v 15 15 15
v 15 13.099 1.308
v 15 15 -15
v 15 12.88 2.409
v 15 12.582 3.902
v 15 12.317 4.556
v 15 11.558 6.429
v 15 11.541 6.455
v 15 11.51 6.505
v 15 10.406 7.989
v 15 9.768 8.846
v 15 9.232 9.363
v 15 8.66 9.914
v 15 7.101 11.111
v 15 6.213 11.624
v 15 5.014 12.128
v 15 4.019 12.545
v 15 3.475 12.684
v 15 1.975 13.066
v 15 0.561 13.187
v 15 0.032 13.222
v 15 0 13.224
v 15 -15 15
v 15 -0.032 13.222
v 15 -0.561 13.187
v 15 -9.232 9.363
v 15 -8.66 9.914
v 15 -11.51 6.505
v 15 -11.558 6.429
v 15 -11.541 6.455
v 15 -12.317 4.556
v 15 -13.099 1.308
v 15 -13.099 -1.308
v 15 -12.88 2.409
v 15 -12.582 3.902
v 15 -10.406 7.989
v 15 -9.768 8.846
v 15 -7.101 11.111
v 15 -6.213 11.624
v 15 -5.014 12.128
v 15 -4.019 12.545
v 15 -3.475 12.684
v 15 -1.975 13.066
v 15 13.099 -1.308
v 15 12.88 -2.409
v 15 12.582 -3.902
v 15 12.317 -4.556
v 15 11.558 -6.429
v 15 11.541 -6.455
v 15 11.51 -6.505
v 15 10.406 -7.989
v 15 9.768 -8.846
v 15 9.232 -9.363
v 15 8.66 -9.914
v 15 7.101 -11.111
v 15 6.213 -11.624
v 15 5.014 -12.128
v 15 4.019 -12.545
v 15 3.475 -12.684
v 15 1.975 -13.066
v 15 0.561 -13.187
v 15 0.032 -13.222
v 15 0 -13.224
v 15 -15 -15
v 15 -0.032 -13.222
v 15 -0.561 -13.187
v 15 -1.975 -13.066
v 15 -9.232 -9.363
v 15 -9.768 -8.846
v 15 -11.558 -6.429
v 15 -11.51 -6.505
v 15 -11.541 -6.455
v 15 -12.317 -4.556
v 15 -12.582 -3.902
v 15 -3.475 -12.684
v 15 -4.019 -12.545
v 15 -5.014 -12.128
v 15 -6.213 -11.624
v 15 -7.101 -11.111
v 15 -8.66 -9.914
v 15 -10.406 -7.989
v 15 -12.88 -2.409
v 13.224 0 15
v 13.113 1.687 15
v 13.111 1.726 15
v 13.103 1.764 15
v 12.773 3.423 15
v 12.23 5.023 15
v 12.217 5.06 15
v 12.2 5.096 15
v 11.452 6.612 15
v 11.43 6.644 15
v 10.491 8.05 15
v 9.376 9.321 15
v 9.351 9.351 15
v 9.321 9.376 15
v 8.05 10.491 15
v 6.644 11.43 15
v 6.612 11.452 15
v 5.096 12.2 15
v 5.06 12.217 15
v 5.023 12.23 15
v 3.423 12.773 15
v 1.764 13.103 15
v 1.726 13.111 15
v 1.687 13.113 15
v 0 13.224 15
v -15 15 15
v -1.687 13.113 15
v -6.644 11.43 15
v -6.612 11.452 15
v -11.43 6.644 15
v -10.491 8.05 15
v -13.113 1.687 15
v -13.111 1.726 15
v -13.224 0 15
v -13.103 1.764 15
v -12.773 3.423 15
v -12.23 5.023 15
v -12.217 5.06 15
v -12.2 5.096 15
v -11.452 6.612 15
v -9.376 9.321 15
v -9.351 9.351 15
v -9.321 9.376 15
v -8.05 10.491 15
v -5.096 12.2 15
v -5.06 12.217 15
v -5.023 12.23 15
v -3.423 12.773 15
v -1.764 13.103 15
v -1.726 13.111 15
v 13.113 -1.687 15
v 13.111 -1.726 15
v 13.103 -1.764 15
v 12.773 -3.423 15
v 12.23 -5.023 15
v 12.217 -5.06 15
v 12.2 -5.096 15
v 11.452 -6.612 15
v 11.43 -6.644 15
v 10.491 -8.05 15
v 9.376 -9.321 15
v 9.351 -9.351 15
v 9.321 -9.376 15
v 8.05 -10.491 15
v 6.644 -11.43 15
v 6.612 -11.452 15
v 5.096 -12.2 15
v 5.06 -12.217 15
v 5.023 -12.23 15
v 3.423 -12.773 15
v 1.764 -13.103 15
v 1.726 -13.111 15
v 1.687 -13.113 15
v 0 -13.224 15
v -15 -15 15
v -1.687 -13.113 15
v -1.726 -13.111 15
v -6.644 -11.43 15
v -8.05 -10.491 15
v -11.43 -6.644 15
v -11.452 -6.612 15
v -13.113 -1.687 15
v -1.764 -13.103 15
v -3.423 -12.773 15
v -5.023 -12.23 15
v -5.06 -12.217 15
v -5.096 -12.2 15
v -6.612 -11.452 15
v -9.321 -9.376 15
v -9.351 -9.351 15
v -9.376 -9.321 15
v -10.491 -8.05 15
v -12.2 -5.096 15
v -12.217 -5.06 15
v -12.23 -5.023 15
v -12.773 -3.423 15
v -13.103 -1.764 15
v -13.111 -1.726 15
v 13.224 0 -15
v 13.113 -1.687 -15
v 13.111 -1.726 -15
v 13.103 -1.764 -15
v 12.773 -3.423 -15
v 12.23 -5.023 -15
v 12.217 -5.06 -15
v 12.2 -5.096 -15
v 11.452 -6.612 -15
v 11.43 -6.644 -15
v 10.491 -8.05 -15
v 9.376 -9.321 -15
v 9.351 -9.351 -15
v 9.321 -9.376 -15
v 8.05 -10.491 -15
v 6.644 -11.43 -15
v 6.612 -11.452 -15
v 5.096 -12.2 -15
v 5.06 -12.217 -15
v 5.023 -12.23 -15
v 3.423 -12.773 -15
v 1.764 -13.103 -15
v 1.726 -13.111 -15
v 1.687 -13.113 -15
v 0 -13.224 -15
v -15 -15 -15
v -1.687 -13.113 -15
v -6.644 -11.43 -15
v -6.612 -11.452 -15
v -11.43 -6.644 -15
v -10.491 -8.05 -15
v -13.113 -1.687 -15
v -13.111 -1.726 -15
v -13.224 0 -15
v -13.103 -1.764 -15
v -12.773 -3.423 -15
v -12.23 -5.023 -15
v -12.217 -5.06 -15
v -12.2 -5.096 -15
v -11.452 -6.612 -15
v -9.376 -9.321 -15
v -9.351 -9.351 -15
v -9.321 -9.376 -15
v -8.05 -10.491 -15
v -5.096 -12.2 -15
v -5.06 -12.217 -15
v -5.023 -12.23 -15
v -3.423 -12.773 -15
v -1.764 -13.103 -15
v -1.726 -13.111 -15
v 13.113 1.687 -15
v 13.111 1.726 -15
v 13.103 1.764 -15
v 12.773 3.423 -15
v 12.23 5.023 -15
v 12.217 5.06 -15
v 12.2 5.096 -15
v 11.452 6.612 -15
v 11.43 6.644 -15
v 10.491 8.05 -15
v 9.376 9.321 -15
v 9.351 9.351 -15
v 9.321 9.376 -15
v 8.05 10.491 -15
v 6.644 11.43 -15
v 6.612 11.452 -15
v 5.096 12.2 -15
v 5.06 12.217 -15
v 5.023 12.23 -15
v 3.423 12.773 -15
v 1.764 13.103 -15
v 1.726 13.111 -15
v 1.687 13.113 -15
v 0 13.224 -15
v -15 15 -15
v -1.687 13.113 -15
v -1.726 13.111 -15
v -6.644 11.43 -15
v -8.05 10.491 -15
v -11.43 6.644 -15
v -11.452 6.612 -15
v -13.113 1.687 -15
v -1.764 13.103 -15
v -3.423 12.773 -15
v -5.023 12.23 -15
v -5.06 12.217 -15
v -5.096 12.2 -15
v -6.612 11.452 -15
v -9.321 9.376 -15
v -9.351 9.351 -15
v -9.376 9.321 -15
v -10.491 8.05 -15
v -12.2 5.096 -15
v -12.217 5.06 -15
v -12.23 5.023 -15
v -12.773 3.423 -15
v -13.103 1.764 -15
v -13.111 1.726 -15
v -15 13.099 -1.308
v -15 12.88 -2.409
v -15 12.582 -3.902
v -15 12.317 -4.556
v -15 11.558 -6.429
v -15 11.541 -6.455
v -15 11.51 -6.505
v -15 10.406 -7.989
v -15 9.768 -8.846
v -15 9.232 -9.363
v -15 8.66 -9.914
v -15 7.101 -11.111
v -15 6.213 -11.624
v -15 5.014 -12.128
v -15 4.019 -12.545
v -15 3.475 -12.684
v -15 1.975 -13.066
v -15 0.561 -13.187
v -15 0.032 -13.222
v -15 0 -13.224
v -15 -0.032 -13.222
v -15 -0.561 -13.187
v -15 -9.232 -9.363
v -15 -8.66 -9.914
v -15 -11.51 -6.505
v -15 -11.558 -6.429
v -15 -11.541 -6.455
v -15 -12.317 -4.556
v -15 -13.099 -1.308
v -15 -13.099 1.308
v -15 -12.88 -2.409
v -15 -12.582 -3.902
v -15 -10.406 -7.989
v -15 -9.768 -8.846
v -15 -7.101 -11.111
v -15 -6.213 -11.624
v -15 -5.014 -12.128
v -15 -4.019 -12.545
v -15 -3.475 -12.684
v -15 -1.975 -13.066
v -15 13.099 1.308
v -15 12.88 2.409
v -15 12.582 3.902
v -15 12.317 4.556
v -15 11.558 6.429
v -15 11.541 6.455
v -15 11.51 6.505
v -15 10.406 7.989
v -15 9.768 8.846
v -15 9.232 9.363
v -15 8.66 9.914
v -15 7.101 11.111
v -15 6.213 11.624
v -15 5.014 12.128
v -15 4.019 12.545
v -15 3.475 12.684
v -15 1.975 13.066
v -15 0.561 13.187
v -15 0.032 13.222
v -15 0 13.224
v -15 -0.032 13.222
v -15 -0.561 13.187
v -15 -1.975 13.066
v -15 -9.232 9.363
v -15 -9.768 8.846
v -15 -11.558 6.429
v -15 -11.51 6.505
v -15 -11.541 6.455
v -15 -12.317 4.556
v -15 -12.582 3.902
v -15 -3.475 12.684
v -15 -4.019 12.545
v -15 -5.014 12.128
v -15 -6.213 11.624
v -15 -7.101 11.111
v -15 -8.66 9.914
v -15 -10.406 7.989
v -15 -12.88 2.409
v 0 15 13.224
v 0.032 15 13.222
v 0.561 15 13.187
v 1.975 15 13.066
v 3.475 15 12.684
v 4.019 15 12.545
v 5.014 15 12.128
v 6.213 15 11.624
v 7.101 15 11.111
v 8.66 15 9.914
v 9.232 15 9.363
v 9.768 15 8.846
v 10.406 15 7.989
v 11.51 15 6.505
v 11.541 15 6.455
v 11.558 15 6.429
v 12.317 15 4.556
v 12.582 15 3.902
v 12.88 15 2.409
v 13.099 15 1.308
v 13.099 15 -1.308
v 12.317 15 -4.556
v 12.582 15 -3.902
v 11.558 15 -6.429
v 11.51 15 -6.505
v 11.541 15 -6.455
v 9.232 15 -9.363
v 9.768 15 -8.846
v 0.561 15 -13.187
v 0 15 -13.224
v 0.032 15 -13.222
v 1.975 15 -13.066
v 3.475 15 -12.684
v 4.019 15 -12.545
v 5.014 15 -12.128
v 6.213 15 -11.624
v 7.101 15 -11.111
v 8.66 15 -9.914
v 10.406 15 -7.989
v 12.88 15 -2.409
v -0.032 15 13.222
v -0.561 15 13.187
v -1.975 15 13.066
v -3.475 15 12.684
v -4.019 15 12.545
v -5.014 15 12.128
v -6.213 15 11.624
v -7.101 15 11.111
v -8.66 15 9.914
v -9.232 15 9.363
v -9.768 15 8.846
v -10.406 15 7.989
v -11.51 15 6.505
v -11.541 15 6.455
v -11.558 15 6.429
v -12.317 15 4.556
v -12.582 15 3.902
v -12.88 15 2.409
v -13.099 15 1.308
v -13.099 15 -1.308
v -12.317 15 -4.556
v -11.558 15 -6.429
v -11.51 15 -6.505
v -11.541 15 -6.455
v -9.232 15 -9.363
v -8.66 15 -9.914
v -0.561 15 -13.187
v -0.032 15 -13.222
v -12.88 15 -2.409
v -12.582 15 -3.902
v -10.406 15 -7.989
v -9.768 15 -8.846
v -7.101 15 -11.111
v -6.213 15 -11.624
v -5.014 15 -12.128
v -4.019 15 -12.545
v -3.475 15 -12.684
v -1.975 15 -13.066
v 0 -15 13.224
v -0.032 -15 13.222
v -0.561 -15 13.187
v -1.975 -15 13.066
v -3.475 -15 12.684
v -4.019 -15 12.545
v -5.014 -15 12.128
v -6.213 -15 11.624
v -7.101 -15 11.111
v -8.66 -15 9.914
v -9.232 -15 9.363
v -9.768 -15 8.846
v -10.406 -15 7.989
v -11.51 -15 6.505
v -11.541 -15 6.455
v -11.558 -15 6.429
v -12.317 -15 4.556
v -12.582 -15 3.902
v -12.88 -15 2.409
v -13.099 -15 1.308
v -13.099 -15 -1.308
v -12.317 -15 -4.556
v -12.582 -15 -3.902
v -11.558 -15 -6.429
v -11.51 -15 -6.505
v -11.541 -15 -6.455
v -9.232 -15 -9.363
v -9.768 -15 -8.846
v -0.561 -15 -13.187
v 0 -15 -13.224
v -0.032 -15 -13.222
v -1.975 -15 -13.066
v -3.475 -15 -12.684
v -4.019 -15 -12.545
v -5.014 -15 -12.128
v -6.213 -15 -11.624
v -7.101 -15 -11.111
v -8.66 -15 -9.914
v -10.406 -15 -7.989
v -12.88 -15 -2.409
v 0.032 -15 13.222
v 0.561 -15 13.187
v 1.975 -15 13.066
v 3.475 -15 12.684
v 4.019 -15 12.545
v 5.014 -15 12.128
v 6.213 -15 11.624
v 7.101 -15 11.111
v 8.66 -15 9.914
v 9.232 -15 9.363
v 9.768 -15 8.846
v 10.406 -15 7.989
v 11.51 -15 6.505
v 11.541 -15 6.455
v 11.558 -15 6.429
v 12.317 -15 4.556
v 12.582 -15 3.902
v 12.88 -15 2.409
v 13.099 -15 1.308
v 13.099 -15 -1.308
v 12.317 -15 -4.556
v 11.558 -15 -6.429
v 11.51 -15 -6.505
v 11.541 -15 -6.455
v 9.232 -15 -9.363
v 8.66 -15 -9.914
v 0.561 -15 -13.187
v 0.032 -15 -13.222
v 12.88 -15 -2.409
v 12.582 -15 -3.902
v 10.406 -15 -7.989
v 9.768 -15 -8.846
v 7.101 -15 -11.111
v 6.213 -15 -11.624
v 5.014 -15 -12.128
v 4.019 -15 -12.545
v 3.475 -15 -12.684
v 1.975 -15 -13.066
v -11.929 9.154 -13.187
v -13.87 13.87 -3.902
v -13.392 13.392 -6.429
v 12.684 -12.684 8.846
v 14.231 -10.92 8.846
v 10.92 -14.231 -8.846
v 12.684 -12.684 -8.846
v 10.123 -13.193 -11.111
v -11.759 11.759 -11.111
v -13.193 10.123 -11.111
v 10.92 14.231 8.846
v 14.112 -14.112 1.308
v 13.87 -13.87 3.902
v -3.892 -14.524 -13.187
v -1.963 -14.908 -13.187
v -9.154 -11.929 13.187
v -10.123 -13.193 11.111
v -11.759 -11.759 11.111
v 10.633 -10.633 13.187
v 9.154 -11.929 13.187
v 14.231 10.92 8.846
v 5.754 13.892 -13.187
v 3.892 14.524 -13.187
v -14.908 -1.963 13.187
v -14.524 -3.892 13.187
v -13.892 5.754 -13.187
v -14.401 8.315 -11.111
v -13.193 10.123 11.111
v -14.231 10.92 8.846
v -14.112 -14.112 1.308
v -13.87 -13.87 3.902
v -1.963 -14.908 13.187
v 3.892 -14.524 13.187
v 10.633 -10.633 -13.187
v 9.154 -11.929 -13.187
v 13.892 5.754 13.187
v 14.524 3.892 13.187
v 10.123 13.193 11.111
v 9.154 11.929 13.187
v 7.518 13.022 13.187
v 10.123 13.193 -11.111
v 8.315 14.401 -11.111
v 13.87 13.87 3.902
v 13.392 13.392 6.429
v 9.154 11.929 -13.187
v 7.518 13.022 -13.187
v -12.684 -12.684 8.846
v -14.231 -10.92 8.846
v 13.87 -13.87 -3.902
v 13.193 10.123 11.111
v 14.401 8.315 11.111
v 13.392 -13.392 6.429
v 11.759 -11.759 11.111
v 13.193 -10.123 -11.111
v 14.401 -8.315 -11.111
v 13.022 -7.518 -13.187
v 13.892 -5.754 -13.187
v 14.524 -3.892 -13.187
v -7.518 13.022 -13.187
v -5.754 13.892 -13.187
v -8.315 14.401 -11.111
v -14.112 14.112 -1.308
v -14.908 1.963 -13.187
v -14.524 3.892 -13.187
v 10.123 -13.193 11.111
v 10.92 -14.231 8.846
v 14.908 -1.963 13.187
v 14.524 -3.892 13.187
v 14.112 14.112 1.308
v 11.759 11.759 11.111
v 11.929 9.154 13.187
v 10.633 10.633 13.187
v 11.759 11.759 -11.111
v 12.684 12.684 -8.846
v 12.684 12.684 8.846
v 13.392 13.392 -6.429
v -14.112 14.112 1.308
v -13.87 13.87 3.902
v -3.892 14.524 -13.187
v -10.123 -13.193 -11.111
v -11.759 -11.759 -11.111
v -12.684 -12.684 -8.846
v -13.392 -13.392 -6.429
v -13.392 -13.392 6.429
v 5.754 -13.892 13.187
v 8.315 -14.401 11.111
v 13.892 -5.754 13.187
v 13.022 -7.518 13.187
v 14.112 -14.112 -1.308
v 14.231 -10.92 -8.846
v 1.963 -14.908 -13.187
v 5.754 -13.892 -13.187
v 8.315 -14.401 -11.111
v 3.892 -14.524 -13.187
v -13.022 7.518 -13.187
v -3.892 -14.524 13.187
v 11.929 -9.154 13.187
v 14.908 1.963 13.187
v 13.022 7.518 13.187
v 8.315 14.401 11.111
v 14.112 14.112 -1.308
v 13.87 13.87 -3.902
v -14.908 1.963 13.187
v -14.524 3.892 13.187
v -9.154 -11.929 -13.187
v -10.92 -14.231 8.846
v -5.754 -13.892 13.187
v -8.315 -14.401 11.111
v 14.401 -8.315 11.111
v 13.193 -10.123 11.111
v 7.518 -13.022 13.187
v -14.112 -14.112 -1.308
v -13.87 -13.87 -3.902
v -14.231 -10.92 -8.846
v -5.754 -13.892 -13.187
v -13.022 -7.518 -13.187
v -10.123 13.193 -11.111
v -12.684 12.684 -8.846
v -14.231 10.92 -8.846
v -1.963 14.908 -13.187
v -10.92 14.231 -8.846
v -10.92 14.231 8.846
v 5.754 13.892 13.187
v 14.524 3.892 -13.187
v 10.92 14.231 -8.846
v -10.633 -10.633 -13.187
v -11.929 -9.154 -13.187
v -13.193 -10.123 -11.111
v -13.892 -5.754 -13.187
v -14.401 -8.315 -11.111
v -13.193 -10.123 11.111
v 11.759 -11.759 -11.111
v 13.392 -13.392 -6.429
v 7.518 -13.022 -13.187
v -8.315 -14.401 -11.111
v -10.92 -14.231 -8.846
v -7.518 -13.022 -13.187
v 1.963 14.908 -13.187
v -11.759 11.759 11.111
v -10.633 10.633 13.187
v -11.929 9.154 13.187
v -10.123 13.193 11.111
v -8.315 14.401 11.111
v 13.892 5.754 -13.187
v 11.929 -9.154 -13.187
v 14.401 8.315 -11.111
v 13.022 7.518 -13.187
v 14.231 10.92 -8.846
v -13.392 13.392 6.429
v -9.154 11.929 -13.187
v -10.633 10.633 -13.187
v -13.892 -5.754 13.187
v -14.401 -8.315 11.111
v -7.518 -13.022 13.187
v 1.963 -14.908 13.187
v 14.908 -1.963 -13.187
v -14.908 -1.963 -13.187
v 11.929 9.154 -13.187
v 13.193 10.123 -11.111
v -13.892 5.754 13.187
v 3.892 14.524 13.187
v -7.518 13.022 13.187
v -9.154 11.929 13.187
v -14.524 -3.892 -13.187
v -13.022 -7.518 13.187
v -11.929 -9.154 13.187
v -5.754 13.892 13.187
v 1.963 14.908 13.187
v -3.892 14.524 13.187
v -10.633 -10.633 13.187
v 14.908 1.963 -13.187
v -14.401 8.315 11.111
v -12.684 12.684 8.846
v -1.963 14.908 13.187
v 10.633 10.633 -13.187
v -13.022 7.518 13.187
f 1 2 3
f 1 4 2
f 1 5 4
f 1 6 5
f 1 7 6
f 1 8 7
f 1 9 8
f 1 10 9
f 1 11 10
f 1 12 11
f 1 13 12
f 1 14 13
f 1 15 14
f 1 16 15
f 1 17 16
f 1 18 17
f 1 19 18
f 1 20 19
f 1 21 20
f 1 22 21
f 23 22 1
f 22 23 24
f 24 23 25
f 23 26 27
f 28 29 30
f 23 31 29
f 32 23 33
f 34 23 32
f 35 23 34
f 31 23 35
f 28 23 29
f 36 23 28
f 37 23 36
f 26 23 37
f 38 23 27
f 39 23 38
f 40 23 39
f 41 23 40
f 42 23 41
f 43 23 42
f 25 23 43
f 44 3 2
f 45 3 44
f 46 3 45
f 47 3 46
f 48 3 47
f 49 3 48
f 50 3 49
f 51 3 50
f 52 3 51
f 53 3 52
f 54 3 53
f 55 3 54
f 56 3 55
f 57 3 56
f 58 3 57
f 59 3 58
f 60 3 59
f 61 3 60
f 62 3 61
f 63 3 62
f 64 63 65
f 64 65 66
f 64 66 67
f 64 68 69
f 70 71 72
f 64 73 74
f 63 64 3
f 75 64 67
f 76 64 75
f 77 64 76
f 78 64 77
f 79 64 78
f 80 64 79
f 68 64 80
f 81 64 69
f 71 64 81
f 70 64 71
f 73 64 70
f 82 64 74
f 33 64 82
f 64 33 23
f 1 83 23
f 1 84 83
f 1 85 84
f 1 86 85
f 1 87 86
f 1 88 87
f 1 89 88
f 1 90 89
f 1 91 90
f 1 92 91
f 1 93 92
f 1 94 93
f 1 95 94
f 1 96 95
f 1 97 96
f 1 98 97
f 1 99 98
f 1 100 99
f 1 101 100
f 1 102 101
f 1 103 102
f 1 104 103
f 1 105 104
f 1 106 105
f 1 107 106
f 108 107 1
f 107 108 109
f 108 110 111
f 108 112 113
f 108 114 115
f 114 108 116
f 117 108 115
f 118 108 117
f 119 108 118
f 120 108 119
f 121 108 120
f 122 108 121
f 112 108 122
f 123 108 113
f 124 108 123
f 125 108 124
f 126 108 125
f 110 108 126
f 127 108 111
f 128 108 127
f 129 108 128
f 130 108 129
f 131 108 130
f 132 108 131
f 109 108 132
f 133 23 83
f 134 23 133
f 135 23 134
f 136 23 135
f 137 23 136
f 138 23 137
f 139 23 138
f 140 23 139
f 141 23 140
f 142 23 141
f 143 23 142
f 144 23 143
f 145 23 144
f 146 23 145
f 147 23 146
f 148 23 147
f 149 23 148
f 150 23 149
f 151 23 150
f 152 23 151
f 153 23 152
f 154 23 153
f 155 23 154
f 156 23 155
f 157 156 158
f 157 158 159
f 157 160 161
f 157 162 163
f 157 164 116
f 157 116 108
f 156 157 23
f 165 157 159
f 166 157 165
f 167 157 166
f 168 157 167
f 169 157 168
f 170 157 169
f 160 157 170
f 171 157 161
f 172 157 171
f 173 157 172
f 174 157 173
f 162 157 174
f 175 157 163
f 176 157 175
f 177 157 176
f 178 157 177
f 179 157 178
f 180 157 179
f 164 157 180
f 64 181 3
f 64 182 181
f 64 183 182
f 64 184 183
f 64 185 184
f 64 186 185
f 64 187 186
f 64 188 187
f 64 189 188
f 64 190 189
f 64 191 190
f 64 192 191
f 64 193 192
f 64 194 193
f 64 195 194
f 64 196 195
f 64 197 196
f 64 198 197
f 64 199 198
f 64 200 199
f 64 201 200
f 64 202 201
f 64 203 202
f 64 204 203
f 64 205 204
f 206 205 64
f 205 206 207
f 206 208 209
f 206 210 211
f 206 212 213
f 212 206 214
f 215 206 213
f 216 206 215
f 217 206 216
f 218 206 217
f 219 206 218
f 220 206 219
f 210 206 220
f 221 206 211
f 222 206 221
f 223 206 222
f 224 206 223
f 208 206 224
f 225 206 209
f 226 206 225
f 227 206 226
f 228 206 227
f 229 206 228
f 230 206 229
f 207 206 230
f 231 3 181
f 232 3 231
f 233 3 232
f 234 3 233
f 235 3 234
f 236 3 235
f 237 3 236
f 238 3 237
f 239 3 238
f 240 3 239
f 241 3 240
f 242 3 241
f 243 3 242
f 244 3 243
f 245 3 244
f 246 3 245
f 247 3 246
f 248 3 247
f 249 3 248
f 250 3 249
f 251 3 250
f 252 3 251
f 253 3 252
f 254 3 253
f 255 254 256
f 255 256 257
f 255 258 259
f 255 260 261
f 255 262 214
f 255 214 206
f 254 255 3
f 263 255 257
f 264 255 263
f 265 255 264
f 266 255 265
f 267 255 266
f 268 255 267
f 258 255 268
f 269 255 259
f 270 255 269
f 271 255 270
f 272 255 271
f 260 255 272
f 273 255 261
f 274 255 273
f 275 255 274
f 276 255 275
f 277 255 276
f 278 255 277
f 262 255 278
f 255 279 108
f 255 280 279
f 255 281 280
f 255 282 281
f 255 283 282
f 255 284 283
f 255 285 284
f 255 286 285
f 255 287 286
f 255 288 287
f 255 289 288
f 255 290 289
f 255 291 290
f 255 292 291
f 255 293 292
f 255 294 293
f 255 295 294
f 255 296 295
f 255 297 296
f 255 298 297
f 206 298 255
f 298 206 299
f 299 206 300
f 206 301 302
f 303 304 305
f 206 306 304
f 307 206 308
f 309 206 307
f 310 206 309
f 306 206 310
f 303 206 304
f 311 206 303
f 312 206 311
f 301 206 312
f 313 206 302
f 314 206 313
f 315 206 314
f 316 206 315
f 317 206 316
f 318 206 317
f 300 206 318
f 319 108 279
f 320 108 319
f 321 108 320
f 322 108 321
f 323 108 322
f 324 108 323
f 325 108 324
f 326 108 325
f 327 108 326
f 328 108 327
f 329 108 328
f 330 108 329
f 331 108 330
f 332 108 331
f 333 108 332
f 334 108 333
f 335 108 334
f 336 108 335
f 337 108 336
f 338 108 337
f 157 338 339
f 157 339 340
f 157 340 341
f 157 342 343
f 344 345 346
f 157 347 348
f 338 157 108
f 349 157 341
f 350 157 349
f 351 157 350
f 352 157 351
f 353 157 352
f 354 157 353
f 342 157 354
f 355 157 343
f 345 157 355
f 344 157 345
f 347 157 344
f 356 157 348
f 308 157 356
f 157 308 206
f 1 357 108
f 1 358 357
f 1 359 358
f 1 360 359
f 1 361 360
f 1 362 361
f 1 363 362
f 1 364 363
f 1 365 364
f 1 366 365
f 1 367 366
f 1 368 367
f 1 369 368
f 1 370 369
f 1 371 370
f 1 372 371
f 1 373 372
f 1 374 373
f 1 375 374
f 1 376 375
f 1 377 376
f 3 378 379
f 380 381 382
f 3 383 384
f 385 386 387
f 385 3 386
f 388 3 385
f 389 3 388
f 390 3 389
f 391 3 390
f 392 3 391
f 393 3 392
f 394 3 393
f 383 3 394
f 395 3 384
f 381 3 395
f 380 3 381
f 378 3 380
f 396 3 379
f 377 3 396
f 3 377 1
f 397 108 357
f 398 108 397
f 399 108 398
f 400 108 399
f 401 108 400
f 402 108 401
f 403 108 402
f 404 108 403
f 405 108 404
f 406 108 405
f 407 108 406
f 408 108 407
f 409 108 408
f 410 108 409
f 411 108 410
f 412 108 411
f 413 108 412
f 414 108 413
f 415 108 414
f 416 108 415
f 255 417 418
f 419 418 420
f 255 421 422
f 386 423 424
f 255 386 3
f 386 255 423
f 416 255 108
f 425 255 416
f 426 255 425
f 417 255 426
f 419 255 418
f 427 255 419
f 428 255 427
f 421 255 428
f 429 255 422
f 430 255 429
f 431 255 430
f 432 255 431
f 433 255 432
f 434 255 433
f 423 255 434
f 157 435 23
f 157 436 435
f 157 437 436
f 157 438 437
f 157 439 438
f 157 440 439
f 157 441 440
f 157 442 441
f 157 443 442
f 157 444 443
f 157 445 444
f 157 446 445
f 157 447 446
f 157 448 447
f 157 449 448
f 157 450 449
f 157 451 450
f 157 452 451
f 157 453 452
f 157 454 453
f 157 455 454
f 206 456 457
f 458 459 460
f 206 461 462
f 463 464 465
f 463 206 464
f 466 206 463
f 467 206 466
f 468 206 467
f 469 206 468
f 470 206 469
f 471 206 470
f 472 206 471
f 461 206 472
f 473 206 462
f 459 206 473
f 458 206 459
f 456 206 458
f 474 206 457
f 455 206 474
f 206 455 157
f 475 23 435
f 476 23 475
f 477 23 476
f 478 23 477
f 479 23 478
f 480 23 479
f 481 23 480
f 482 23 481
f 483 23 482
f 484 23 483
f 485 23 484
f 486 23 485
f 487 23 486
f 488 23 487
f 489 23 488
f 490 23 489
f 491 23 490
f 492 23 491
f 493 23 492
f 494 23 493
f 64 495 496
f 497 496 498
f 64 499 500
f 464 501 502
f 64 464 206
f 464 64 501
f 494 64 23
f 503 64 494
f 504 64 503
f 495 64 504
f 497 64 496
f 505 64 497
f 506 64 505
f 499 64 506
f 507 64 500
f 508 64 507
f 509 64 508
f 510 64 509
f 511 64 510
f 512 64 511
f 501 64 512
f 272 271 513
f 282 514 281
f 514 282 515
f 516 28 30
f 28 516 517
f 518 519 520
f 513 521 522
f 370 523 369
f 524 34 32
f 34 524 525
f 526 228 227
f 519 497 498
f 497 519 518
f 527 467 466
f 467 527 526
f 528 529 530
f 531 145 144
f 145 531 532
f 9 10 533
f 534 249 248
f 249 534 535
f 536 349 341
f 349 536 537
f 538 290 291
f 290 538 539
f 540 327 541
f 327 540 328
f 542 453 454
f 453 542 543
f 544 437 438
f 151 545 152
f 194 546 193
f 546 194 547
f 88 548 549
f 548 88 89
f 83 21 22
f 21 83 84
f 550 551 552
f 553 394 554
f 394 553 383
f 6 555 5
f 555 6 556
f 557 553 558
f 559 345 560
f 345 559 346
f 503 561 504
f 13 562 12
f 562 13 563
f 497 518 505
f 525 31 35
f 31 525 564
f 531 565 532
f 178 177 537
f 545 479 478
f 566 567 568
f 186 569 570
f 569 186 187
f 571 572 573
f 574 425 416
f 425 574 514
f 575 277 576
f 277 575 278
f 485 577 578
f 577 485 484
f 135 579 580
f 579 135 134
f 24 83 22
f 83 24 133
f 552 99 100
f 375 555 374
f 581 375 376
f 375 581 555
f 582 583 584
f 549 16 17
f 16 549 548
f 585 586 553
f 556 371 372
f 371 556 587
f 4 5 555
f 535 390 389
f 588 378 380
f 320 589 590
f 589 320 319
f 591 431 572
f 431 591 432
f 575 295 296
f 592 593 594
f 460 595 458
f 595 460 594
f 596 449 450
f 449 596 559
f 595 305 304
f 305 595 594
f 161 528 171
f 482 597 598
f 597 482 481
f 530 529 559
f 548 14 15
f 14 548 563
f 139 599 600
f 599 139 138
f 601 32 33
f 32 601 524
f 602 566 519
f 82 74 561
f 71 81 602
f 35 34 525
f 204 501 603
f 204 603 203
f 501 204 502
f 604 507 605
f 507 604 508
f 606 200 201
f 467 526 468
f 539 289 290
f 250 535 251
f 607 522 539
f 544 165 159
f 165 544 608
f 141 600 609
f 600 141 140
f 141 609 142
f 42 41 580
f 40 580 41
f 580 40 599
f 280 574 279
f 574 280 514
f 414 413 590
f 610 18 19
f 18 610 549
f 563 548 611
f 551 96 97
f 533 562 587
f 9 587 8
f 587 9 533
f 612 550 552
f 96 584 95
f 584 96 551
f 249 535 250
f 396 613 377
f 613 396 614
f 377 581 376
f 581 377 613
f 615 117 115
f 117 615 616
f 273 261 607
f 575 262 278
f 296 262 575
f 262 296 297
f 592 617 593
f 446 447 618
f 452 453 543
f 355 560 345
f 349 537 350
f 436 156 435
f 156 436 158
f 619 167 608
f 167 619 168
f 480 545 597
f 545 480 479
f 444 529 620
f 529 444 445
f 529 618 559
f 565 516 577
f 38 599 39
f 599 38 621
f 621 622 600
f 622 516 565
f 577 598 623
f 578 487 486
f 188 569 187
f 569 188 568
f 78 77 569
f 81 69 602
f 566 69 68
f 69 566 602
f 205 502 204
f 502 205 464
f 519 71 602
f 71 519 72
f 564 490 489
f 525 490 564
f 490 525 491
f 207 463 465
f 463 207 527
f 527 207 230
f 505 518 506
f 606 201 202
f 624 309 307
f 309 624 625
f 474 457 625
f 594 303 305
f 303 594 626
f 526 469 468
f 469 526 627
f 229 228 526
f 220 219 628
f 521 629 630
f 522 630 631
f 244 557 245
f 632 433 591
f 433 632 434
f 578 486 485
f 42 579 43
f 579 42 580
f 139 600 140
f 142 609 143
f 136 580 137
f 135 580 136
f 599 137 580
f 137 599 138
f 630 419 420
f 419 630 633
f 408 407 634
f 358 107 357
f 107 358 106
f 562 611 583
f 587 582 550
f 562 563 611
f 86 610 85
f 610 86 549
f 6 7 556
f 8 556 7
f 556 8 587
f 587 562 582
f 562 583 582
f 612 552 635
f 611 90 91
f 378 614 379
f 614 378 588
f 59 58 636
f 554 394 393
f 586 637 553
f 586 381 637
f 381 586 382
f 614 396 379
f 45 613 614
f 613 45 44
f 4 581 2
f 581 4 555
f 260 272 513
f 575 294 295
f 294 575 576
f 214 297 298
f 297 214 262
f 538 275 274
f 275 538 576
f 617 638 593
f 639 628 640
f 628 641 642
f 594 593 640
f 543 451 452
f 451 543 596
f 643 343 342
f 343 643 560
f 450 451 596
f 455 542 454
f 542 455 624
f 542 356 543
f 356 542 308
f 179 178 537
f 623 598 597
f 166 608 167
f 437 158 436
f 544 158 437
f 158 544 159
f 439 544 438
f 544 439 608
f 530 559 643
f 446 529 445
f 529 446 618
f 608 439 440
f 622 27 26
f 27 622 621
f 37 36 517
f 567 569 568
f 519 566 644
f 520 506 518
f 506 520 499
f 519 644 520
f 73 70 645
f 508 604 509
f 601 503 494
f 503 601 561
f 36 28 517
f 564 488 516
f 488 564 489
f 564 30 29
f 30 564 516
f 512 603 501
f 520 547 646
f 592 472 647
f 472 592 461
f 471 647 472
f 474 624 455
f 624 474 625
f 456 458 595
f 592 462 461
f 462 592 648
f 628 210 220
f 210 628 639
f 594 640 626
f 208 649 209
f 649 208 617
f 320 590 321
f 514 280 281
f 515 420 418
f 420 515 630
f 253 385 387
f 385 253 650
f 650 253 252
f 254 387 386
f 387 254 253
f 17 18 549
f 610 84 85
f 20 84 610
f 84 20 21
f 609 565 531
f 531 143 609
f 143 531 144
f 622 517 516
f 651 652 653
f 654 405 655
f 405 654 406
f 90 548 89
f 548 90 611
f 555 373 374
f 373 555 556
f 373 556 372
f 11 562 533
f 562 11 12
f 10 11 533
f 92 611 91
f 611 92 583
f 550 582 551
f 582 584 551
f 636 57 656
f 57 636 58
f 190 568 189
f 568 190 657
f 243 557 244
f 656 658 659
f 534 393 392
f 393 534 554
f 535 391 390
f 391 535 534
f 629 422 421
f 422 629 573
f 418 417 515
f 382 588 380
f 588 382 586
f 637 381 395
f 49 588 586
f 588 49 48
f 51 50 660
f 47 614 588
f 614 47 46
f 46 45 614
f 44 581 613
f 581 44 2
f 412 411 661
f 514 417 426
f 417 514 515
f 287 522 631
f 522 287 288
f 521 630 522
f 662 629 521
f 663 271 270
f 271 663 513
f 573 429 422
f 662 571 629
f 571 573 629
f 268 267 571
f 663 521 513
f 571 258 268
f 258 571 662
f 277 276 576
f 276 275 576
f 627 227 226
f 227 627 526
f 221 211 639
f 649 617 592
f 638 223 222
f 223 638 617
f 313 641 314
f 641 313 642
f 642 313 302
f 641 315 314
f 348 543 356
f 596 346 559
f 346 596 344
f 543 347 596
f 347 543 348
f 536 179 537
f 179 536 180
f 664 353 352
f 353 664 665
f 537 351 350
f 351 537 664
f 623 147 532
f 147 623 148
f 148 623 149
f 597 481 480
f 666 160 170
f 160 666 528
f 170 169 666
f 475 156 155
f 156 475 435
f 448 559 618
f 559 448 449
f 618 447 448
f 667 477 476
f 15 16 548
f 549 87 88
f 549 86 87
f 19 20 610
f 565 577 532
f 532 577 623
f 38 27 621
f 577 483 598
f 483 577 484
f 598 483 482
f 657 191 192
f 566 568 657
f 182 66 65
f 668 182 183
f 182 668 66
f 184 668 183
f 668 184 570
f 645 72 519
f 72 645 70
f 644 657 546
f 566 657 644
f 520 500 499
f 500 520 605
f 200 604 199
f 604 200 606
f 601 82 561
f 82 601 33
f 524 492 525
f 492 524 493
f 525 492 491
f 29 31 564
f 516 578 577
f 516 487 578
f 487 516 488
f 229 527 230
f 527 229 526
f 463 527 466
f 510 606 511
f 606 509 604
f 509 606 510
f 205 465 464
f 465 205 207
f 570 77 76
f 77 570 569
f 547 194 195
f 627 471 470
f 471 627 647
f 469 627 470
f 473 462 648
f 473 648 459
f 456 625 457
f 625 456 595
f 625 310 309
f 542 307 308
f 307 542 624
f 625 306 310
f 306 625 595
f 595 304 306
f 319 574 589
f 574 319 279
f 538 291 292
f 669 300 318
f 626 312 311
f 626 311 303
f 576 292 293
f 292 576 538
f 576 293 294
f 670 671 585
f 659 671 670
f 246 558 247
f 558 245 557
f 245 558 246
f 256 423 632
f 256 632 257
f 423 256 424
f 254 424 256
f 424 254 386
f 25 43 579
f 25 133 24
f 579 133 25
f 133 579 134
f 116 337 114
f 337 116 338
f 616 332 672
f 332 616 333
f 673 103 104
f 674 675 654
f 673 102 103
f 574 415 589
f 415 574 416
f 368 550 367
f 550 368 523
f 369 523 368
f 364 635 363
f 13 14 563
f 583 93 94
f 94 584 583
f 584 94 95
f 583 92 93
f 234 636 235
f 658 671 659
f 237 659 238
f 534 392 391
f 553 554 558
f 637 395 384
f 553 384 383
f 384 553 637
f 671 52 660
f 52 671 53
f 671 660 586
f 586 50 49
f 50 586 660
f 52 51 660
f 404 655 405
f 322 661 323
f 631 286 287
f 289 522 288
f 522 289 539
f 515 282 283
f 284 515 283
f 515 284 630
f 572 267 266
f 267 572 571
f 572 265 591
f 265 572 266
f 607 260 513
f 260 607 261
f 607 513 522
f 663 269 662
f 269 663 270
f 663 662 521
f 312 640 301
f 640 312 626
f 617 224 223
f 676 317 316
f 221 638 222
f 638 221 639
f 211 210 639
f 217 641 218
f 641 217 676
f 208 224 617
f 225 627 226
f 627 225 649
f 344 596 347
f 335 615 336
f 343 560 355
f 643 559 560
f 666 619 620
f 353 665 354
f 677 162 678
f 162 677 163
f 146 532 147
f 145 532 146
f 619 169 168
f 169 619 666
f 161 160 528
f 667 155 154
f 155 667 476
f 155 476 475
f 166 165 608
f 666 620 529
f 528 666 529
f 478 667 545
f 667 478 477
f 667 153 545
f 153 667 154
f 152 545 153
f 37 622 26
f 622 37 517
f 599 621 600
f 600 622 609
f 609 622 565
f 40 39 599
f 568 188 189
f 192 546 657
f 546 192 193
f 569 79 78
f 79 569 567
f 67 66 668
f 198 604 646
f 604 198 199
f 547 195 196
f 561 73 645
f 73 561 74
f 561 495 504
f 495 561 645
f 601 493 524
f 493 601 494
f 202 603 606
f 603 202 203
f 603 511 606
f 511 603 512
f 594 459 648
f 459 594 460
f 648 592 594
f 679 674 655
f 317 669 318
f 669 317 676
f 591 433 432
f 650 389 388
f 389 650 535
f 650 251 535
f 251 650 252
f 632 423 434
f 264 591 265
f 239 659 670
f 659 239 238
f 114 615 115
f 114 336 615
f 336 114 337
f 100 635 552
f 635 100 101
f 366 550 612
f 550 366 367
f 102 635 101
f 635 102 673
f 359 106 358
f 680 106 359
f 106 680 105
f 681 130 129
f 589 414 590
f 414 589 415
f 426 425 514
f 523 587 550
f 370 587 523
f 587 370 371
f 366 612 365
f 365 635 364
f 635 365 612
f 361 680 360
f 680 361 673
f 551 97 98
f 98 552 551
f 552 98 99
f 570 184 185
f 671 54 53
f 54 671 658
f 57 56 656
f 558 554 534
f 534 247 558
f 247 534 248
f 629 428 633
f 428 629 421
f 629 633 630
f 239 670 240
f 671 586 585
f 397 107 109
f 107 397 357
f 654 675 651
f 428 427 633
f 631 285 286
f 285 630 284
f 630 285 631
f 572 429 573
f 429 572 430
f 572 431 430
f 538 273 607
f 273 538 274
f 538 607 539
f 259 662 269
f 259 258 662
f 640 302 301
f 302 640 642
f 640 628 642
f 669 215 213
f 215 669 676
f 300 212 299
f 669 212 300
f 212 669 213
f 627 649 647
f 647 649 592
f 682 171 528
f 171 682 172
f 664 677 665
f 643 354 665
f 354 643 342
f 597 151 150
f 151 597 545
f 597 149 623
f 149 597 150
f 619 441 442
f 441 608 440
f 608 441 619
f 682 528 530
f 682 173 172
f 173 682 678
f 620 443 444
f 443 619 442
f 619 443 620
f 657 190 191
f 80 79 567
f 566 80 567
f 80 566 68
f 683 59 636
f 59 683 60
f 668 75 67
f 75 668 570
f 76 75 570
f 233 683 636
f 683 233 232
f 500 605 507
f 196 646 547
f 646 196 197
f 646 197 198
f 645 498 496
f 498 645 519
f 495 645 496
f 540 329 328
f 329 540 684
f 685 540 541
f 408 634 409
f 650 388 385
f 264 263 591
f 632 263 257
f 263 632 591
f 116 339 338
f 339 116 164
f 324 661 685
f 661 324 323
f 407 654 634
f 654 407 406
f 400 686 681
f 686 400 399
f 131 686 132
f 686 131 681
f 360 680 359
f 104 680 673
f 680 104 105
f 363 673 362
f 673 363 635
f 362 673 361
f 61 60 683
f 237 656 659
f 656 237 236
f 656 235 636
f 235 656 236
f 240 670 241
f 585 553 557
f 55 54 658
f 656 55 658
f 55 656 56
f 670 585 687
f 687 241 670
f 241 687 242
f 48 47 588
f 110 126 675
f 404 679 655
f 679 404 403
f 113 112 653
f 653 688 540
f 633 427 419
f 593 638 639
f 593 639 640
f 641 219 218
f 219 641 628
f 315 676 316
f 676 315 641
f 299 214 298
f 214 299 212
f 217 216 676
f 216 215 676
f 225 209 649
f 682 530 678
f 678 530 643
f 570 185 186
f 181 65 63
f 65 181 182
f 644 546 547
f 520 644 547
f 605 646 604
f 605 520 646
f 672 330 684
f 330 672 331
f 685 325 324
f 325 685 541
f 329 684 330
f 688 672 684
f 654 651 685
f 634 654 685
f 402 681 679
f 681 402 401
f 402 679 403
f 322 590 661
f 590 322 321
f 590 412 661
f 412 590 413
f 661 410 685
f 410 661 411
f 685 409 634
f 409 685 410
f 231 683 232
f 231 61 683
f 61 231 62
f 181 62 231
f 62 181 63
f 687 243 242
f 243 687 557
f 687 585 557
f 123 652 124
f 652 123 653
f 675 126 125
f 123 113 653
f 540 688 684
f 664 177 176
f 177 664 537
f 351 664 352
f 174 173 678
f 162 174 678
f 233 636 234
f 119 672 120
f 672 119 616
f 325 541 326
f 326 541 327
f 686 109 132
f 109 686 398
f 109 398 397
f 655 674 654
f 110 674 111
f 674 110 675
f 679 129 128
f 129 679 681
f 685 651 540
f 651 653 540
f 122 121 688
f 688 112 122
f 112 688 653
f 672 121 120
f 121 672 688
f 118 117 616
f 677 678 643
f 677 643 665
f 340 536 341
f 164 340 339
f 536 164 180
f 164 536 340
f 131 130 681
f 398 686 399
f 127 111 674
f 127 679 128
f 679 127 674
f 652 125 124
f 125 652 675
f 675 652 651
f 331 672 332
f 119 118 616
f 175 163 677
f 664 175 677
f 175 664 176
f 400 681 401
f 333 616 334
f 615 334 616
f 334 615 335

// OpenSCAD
// ChiselCAD test file — classic CSG operations
$fn = 48;

difference() {
    cube([30, 30, 30], center=true);
    sphere(r=20);
}
